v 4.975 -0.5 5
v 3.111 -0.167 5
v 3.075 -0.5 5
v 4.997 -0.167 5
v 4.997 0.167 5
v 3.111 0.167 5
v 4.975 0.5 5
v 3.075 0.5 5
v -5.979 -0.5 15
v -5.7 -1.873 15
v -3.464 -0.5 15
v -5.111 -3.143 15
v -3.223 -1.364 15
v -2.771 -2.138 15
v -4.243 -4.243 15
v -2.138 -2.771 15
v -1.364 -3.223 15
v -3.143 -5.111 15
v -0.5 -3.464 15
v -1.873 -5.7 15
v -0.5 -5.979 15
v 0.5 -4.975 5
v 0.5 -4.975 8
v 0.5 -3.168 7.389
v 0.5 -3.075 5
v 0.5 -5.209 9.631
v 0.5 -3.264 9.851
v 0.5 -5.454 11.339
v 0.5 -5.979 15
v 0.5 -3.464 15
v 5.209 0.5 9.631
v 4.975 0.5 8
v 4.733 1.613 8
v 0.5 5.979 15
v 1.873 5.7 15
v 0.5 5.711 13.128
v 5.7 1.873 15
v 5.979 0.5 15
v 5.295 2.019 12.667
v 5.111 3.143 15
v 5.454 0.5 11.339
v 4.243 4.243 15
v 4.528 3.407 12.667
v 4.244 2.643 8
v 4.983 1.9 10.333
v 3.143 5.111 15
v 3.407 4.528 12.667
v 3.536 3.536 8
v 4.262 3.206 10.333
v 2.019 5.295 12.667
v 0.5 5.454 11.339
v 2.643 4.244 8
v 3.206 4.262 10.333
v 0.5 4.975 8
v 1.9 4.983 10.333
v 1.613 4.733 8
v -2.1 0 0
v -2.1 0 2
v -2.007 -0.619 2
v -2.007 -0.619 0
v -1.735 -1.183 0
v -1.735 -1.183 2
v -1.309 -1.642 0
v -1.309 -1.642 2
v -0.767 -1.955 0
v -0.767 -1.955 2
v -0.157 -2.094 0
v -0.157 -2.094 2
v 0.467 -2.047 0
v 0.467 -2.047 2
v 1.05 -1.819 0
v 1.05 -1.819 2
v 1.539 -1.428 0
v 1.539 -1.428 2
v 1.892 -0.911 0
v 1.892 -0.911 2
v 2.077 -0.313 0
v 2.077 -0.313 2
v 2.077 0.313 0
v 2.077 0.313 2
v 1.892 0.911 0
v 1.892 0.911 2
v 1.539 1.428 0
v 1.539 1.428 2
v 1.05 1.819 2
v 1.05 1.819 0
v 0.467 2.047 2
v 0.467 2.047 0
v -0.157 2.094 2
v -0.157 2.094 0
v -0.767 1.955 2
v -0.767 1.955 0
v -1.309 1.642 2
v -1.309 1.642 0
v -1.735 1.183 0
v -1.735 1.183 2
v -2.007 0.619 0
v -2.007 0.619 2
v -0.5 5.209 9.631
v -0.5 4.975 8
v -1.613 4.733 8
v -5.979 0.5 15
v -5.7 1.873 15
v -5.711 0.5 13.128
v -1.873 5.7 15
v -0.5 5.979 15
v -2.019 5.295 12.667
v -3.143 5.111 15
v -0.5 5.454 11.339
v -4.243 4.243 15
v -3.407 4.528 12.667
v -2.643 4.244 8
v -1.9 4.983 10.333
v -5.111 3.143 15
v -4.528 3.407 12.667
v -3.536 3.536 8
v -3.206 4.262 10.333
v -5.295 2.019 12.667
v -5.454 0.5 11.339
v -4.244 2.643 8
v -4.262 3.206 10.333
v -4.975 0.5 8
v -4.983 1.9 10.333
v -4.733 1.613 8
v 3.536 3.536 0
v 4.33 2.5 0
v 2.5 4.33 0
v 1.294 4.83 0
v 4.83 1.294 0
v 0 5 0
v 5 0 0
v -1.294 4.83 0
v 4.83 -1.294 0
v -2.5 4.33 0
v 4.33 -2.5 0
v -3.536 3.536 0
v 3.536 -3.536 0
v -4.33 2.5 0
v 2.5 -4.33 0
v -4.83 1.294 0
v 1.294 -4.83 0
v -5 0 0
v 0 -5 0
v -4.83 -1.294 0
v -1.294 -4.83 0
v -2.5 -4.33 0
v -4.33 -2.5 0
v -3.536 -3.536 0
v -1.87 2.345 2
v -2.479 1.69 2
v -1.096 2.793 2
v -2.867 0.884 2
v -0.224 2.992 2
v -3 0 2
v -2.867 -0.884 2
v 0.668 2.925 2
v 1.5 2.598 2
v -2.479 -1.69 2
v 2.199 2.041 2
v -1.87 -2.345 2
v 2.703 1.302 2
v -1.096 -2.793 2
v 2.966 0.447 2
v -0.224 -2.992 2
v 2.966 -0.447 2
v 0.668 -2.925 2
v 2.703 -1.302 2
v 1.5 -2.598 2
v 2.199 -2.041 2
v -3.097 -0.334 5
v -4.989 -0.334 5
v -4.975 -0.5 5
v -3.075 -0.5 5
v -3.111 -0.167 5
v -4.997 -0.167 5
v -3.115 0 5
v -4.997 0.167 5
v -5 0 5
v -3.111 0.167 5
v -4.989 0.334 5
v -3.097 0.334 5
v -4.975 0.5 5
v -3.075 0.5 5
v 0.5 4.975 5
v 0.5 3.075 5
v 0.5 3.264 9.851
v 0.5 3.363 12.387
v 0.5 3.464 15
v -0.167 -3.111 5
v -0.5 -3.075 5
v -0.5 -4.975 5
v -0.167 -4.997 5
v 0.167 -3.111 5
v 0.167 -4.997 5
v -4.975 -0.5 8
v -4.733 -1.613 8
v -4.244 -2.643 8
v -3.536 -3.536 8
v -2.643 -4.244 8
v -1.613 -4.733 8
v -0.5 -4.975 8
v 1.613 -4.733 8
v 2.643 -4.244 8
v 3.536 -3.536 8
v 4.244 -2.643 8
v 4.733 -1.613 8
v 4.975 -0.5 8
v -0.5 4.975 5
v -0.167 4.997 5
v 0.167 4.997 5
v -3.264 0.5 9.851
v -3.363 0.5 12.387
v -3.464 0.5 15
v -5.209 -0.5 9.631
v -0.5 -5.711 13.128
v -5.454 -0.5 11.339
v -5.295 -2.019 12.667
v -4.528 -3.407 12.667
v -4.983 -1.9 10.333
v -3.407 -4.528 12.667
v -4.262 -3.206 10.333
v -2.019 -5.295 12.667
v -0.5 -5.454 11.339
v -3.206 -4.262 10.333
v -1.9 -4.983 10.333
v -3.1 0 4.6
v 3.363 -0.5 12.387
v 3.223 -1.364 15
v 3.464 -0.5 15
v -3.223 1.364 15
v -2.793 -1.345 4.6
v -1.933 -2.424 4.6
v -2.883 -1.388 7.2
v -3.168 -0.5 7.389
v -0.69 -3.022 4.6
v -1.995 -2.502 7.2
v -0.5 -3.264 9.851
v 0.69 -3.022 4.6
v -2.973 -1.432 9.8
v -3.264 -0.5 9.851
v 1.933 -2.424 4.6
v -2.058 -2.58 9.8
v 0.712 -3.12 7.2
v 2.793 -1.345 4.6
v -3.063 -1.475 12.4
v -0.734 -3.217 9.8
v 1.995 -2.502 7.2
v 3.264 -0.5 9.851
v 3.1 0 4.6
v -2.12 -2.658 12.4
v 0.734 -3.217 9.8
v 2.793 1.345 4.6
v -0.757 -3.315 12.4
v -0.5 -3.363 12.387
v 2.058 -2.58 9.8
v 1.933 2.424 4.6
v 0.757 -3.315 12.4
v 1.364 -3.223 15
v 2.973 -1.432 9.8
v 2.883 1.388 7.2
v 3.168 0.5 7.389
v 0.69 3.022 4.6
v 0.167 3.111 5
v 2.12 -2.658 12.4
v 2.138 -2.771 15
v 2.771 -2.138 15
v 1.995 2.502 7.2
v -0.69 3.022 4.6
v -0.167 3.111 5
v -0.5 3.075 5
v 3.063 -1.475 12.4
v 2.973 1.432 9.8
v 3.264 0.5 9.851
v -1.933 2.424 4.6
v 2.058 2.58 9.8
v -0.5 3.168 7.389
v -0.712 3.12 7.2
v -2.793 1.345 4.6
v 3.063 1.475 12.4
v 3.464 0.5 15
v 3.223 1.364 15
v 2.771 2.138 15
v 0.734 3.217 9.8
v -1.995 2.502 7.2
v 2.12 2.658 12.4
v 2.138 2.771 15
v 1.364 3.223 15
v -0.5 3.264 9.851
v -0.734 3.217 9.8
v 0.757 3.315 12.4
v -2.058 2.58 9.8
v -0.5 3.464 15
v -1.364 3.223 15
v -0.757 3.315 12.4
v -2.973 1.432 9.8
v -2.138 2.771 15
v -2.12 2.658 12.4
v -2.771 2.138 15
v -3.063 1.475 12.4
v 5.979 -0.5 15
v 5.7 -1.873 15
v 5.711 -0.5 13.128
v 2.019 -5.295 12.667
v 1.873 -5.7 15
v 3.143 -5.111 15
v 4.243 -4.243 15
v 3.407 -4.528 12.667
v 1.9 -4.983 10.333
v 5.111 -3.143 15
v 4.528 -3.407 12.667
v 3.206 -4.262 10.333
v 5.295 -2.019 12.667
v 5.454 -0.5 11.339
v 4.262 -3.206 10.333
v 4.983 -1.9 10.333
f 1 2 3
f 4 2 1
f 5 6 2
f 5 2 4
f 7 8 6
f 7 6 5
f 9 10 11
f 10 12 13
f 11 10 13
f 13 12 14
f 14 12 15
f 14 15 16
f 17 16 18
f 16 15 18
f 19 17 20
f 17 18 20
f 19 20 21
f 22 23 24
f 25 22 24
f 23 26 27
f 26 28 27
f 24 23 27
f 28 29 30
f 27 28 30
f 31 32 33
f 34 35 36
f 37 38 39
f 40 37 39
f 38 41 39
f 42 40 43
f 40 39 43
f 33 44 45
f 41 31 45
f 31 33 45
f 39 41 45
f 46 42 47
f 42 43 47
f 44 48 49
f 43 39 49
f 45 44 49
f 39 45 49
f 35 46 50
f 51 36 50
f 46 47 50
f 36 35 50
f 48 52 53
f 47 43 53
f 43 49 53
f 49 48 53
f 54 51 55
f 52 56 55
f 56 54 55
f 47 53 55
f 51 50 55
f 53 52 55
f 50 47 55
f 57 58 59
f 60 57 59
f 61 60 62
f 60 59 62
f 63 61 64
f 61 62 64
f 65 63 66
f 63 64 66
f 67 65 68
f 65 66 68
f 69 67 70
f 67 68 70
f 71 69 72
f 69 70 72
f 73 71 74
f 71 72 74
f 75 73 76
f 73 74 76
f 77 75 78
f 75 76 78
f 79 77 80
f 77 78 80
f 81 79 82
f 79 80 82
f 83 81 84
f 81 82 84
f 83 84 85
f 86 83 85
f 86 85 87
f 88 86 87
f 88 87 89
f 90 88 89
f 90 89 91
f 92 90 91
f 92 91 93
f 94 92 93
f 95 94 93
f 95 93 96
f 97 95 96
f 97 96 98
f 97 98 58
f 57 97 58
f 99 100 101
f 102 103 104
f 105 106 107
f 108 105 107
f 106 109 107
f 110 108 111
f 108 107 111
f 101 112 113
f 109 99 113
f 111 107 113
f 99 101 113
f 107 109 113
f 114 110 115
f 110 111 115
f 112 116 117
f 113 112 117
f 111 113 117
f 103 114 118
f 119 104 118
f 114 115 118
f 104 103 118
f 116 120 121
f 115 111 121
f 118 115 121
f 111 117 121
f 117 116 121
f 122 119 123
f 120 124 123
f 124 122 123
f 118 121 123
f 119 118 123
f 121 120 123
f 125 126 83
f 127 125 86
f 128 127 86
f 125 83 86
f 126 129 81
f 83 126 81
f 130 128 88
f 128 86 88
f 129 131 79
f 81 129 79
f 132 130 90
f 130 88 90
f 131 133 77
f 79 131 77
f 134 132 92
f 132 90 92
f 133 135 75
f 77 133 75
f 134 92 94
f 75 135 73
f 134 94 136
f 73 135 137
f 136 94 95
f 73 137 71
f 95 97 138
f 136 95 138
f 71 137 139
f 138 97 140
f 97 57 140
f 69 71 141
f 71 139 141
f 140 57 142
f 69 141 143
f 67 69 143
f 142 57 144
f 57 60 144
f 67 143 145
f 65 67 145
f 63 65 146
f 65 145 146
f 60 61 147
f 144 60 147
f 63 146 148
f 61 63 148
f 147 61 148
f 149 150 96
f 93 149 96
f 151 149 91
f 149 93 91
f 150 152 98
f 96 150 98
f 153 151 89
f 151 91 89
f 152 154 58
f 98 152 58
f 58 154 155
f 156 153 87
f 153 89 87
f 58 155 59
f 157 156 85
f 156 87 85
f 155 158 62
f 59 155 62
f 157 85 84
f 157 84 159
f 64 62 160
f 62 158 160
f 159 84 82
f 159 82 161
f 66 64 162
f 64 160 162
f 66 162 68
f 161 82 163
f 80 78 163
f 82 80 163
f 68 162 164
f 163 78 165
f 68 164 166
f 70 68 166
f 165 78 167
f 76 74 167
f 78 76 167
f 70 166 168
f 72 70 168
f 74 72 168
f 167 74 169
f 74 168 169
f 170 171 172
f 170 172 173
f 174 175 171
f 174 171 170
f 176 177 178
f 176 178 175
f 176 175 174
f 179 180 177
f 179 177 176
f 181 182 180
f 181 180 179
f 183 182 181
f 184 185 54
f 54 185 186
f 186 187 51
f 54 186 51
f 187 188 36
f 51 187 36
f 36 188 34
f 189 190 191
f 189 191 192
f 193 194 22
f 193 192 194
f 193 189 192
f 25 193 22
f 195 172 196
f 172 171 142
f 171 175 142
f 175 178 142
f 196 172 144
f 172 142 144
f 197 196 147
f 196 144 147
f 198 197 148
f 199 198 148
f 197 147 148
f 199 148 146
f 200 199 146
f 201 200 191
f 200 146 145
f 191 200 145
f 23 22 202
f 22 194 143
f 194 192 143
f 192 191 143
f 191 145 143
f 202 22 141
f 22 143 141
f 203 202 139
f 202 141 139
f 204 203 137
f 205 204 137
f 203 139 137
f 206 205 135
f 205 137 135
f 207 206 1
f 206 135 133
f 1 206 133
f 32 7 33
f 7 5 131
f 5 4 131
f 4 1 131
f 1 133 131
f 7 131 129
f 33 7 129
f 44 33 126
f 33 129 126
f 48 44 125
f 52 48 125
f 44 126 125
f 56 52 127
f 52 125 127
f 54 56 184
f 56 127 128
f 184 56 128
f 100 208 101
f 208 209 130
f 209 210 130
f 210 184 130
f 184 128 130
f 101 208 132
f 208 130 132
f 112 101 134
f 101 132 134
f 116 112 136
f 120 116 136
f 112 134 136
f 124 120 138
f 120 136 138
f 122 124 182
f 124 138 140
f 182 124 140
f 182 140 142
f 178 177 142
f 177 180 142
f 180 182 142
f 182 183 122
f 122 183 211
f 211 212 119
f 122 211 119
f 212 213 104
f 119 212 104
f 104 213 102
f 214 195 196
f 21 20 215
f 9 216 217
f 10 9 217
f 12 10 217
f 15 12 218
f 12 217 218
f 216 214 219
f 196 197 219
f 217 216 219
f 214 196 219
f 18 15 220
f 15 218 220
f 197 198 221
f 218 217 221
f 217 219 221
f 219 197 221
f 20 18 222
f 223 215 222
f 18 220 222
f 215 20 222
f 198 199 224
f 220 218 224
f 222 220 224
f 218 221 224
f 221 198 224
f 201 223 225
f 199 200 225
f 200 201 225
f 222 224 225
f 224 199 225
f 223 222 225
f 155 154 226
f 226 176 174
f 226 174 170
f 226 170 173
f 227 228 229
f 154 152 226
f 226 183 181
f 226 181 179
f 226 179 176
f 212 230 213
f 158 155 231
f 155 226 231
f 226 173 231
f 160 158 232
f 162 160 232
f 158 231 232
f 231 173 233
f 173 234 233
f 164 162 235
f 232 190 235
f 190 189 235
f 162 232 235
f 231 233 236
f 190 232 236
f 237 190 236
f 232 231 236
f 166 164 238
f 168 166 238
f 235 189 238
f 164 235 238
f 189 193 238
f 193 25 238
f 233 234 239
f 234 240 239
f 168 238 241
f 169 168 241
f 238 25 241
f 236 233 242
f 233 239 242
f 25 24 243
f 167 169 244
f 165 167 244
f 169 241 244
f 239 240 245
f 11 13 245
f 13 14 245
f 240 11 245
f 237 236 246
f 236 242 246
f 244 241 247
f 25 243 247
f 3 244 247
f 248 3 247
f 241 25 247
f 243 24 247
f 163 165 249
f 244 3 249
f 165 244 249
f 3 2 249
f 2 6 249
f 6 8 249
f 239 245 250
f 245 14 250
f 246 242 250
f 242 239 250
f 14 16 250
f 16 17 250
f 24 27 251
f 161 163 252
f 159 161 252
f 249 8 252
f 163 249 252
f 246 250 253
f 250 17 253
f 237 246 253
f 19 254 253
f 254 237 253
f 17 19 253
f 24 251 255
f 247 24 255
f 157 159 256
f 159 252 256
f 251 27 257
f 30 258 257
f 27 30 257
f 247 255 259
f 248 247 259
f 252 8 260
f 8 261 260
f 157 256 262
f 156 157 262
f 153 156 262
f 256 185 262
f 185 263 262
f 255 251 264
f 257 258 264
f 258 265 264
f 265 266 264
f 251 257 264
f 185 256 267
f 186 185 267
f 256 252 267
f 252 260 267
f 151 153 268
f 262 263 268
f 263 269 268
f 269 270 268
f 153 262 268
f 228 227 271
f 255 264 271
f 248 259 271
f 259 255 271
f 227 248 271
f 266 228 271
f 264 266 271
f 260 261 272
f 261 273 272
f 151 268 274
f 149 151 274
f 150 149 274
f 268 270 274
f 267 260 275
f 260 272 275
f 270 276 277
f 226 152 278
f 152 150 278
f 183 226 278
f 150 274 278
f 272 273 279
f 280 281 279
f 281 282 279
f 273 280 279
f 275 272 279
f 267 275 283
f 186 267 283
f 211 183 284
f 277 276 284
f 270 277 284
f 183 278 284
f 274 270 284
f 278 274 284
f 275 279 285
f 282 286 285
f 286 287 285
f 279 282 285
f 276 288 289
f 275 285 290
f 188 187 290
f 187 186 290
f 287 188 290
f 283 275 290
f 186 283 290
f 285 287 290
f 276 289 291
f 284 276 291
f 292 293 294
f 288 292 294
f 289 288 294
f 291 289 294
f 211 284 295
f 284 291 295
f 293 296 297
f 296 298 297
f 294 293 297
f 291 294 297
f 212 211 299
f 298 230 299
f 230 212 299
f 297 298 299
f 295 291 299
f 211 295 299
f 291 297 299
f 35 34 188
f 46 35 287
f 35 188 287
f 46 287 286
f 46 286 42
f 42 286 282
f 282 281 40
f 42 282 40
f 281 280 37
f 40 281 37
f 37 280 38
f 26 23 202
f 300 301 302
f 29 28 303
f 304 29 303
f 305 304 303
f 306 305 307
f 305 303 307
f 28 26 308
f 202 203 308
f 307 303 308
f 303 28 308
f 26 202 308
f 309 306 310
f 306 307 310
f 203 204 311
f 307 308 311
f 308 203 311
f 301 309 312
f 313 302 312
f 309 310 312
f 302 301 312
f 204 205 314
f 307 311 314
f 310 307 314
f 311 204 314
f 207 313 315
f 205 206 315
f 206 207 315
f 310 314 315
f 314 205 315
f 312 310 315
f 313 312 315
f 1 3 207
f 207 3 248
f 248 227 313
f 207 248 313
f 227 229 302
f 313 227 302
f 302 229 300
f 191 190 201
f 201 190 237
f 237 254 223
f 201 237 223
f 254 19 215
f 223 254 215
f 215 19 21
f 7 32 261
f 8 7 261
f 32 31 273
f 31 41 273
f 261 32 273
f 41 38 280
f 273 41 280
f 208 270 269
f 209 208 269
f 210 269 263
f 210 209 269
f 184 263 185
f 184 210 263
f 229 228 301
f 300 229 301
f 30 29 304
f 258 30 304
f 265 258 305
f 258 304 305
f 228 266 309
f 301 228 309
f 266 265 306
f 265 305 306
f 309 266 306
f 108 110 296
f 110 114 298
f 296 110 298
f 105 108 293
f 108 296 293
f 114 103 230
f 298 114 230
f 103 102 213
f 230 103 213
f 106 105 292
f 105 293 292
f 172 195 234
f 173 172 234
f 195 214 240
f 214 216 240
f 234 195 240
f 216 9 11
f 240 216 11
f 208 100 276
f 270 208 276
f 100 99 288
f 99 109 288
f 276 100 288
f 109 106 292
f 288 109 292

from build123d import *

# Parameters (mm, degrees)
F3_D     = 4.2
F5_DEPTH = 10


with BuildPart() as f1:
    # F0 (on Front) → F1 (revolve)
    with BuildSketch(Plane.XZ):
        Polygon((-5, 0), (0, 0), (0, 2), (-3, 2), (-3.5, 15), (-6, 15), (-5, 8), align=None)
    revolve(axis=Axis((0, 0, 1), (0, 0, 1)))

    # F3 (through all)
    with Locations(Plane(origin=(0, 0, 0), x_dir=(1, 0, 0), z_dir=(0, 0, -1))):
        with Locations((0, 0)):
            Hole(F3_D / 2)

    # F4 (on face) → F5 (cut)
    with BuildSketch(Plane.XY.offset(15)):
        with BuildLine():
            Line((-2.0396078054, 0.5), (-3.4641016151, 0.5))
            ThreePointArc((-3.4641016151, 0.5), (-3.5, 0), (-3.4641016151, -0.5))
            Line((-3.4641016151, -0.5), (-2.0396078054, -0.5))
            ThreePointArc((-2.0396078054, -0.5), (-2.1, 0), (-2.0396078054, 0.5))
        make_face()
        with BuildLine():
            Line((-3.4641016151, 0.5), (-5.9791303716, 0.5))
            ThreePointArc((-5.9791303716, 0.5), (-6, 0), (-5.9791303716, -0.5))
            Line((-5.9791303716, -0.5), (-3.4641016151, -0.5))
            ThreePointArc((-3.4641016151, -0.5), (-3.5, 0), (-3.4641016151, 0.5))
        make_face()
        with BuildLine():
            ThreePointArc((0.5, 3.4641016151), (0, 3.5), (-0.5, 3.4641016151))
            Line((-0.5, 3.4641016151), (-0.5, 2.0396078054))
            ThreePointArc((-0.5, 2.0396078054), (0, 2.1), (0.5, 2.0396078054))
            Line((0.5, 2.0396078054), (0.5, 3.4641016151))
        make_face()
        with BuildLine():
            ThreePointArc((0.5, 5.9791303716), (0, 6), (-0.5, 5.9791303716))
            Line((-0.5, 5.9791303716), (-0.5, 3.4641016151))
            ThreePointArc((-0.5, 3.4641016151), (0, 3.5), (0.5, 3.4641016151))
            Line((0.5, 3.4641016151), (0.5, 5.9791303716))
        make_face()
        with BuildLine():
            ThreePointArc((3.5, 0), (3.491013868, 0.2506435188), (3.4641016151, 0.5))
            Line((3.4641016151, 0.5), (2.0396078054, 0.5))
            ThreePointArc((2.0396078054, 0.5), (2.1, 0), (2.0396078054, -0.5))
            Line((2.0396078054, -0.5), (3.4641016151, -0.5))
            ThreePointArc((3.4641016151, -0.5), (3.491013868, -0.2506435188), (3.5, 0))
        make_face()
        with BuildLine():
            ThreePointArc((6, 0), (5.9947803225, 0.2502176759), (5.9791303716, 0.5))
            Line((5.9791303716, 0.5), (3.4641016151, 0.5))
            ThreePointArc((3.4641016151, 0.5), (3.491013868, 0.2506435188), (3.5, 0))
            ThreePointArc((3.5, 0), (3.491013868, -0.2506435188), (3.4641016151, -0.5))
            Line((3.4641016151, -0.5), (5.9791303716, -0.5))
            ThreePointArc((5.9791303716, -0.5), (5.9947803225, -0.2502176759), (6, 0))
        make_face()
        with BuildLine():
            Line((-0.5, -2.0396078054), (-0.5, -3.4641016151))
            ThreePointArc((-0.5, -3.4641016151), (0, -3.5), (0.5, -3.4641016151))
            Line((0.5, -3.4641016151), (0.5, -2.0396078054))
            ThreePointArc((0.5, -2.0396078054), (0, -2.1), (-0.5, -2.0396078054))
        make_face()
        with BuildLine():
            Line((-0.5, -3.4641016151), (-0.5, -5.9791303716))
            ThreePointArc((-0.5, -5.9791303716), (0, -6), (0.5, -5.9791303716))
            Line((0.5, -5.9791303716), (0.5, -3.4641016151))
            ThreePointArc((0.5, -3.4641016151), (0, -3.5), (-0.5, -3.4641016151))
        make_face()
    extrude(amount=-F5_DEPTH, mode=Mode.SUBTRACT)


solid = f1.part
